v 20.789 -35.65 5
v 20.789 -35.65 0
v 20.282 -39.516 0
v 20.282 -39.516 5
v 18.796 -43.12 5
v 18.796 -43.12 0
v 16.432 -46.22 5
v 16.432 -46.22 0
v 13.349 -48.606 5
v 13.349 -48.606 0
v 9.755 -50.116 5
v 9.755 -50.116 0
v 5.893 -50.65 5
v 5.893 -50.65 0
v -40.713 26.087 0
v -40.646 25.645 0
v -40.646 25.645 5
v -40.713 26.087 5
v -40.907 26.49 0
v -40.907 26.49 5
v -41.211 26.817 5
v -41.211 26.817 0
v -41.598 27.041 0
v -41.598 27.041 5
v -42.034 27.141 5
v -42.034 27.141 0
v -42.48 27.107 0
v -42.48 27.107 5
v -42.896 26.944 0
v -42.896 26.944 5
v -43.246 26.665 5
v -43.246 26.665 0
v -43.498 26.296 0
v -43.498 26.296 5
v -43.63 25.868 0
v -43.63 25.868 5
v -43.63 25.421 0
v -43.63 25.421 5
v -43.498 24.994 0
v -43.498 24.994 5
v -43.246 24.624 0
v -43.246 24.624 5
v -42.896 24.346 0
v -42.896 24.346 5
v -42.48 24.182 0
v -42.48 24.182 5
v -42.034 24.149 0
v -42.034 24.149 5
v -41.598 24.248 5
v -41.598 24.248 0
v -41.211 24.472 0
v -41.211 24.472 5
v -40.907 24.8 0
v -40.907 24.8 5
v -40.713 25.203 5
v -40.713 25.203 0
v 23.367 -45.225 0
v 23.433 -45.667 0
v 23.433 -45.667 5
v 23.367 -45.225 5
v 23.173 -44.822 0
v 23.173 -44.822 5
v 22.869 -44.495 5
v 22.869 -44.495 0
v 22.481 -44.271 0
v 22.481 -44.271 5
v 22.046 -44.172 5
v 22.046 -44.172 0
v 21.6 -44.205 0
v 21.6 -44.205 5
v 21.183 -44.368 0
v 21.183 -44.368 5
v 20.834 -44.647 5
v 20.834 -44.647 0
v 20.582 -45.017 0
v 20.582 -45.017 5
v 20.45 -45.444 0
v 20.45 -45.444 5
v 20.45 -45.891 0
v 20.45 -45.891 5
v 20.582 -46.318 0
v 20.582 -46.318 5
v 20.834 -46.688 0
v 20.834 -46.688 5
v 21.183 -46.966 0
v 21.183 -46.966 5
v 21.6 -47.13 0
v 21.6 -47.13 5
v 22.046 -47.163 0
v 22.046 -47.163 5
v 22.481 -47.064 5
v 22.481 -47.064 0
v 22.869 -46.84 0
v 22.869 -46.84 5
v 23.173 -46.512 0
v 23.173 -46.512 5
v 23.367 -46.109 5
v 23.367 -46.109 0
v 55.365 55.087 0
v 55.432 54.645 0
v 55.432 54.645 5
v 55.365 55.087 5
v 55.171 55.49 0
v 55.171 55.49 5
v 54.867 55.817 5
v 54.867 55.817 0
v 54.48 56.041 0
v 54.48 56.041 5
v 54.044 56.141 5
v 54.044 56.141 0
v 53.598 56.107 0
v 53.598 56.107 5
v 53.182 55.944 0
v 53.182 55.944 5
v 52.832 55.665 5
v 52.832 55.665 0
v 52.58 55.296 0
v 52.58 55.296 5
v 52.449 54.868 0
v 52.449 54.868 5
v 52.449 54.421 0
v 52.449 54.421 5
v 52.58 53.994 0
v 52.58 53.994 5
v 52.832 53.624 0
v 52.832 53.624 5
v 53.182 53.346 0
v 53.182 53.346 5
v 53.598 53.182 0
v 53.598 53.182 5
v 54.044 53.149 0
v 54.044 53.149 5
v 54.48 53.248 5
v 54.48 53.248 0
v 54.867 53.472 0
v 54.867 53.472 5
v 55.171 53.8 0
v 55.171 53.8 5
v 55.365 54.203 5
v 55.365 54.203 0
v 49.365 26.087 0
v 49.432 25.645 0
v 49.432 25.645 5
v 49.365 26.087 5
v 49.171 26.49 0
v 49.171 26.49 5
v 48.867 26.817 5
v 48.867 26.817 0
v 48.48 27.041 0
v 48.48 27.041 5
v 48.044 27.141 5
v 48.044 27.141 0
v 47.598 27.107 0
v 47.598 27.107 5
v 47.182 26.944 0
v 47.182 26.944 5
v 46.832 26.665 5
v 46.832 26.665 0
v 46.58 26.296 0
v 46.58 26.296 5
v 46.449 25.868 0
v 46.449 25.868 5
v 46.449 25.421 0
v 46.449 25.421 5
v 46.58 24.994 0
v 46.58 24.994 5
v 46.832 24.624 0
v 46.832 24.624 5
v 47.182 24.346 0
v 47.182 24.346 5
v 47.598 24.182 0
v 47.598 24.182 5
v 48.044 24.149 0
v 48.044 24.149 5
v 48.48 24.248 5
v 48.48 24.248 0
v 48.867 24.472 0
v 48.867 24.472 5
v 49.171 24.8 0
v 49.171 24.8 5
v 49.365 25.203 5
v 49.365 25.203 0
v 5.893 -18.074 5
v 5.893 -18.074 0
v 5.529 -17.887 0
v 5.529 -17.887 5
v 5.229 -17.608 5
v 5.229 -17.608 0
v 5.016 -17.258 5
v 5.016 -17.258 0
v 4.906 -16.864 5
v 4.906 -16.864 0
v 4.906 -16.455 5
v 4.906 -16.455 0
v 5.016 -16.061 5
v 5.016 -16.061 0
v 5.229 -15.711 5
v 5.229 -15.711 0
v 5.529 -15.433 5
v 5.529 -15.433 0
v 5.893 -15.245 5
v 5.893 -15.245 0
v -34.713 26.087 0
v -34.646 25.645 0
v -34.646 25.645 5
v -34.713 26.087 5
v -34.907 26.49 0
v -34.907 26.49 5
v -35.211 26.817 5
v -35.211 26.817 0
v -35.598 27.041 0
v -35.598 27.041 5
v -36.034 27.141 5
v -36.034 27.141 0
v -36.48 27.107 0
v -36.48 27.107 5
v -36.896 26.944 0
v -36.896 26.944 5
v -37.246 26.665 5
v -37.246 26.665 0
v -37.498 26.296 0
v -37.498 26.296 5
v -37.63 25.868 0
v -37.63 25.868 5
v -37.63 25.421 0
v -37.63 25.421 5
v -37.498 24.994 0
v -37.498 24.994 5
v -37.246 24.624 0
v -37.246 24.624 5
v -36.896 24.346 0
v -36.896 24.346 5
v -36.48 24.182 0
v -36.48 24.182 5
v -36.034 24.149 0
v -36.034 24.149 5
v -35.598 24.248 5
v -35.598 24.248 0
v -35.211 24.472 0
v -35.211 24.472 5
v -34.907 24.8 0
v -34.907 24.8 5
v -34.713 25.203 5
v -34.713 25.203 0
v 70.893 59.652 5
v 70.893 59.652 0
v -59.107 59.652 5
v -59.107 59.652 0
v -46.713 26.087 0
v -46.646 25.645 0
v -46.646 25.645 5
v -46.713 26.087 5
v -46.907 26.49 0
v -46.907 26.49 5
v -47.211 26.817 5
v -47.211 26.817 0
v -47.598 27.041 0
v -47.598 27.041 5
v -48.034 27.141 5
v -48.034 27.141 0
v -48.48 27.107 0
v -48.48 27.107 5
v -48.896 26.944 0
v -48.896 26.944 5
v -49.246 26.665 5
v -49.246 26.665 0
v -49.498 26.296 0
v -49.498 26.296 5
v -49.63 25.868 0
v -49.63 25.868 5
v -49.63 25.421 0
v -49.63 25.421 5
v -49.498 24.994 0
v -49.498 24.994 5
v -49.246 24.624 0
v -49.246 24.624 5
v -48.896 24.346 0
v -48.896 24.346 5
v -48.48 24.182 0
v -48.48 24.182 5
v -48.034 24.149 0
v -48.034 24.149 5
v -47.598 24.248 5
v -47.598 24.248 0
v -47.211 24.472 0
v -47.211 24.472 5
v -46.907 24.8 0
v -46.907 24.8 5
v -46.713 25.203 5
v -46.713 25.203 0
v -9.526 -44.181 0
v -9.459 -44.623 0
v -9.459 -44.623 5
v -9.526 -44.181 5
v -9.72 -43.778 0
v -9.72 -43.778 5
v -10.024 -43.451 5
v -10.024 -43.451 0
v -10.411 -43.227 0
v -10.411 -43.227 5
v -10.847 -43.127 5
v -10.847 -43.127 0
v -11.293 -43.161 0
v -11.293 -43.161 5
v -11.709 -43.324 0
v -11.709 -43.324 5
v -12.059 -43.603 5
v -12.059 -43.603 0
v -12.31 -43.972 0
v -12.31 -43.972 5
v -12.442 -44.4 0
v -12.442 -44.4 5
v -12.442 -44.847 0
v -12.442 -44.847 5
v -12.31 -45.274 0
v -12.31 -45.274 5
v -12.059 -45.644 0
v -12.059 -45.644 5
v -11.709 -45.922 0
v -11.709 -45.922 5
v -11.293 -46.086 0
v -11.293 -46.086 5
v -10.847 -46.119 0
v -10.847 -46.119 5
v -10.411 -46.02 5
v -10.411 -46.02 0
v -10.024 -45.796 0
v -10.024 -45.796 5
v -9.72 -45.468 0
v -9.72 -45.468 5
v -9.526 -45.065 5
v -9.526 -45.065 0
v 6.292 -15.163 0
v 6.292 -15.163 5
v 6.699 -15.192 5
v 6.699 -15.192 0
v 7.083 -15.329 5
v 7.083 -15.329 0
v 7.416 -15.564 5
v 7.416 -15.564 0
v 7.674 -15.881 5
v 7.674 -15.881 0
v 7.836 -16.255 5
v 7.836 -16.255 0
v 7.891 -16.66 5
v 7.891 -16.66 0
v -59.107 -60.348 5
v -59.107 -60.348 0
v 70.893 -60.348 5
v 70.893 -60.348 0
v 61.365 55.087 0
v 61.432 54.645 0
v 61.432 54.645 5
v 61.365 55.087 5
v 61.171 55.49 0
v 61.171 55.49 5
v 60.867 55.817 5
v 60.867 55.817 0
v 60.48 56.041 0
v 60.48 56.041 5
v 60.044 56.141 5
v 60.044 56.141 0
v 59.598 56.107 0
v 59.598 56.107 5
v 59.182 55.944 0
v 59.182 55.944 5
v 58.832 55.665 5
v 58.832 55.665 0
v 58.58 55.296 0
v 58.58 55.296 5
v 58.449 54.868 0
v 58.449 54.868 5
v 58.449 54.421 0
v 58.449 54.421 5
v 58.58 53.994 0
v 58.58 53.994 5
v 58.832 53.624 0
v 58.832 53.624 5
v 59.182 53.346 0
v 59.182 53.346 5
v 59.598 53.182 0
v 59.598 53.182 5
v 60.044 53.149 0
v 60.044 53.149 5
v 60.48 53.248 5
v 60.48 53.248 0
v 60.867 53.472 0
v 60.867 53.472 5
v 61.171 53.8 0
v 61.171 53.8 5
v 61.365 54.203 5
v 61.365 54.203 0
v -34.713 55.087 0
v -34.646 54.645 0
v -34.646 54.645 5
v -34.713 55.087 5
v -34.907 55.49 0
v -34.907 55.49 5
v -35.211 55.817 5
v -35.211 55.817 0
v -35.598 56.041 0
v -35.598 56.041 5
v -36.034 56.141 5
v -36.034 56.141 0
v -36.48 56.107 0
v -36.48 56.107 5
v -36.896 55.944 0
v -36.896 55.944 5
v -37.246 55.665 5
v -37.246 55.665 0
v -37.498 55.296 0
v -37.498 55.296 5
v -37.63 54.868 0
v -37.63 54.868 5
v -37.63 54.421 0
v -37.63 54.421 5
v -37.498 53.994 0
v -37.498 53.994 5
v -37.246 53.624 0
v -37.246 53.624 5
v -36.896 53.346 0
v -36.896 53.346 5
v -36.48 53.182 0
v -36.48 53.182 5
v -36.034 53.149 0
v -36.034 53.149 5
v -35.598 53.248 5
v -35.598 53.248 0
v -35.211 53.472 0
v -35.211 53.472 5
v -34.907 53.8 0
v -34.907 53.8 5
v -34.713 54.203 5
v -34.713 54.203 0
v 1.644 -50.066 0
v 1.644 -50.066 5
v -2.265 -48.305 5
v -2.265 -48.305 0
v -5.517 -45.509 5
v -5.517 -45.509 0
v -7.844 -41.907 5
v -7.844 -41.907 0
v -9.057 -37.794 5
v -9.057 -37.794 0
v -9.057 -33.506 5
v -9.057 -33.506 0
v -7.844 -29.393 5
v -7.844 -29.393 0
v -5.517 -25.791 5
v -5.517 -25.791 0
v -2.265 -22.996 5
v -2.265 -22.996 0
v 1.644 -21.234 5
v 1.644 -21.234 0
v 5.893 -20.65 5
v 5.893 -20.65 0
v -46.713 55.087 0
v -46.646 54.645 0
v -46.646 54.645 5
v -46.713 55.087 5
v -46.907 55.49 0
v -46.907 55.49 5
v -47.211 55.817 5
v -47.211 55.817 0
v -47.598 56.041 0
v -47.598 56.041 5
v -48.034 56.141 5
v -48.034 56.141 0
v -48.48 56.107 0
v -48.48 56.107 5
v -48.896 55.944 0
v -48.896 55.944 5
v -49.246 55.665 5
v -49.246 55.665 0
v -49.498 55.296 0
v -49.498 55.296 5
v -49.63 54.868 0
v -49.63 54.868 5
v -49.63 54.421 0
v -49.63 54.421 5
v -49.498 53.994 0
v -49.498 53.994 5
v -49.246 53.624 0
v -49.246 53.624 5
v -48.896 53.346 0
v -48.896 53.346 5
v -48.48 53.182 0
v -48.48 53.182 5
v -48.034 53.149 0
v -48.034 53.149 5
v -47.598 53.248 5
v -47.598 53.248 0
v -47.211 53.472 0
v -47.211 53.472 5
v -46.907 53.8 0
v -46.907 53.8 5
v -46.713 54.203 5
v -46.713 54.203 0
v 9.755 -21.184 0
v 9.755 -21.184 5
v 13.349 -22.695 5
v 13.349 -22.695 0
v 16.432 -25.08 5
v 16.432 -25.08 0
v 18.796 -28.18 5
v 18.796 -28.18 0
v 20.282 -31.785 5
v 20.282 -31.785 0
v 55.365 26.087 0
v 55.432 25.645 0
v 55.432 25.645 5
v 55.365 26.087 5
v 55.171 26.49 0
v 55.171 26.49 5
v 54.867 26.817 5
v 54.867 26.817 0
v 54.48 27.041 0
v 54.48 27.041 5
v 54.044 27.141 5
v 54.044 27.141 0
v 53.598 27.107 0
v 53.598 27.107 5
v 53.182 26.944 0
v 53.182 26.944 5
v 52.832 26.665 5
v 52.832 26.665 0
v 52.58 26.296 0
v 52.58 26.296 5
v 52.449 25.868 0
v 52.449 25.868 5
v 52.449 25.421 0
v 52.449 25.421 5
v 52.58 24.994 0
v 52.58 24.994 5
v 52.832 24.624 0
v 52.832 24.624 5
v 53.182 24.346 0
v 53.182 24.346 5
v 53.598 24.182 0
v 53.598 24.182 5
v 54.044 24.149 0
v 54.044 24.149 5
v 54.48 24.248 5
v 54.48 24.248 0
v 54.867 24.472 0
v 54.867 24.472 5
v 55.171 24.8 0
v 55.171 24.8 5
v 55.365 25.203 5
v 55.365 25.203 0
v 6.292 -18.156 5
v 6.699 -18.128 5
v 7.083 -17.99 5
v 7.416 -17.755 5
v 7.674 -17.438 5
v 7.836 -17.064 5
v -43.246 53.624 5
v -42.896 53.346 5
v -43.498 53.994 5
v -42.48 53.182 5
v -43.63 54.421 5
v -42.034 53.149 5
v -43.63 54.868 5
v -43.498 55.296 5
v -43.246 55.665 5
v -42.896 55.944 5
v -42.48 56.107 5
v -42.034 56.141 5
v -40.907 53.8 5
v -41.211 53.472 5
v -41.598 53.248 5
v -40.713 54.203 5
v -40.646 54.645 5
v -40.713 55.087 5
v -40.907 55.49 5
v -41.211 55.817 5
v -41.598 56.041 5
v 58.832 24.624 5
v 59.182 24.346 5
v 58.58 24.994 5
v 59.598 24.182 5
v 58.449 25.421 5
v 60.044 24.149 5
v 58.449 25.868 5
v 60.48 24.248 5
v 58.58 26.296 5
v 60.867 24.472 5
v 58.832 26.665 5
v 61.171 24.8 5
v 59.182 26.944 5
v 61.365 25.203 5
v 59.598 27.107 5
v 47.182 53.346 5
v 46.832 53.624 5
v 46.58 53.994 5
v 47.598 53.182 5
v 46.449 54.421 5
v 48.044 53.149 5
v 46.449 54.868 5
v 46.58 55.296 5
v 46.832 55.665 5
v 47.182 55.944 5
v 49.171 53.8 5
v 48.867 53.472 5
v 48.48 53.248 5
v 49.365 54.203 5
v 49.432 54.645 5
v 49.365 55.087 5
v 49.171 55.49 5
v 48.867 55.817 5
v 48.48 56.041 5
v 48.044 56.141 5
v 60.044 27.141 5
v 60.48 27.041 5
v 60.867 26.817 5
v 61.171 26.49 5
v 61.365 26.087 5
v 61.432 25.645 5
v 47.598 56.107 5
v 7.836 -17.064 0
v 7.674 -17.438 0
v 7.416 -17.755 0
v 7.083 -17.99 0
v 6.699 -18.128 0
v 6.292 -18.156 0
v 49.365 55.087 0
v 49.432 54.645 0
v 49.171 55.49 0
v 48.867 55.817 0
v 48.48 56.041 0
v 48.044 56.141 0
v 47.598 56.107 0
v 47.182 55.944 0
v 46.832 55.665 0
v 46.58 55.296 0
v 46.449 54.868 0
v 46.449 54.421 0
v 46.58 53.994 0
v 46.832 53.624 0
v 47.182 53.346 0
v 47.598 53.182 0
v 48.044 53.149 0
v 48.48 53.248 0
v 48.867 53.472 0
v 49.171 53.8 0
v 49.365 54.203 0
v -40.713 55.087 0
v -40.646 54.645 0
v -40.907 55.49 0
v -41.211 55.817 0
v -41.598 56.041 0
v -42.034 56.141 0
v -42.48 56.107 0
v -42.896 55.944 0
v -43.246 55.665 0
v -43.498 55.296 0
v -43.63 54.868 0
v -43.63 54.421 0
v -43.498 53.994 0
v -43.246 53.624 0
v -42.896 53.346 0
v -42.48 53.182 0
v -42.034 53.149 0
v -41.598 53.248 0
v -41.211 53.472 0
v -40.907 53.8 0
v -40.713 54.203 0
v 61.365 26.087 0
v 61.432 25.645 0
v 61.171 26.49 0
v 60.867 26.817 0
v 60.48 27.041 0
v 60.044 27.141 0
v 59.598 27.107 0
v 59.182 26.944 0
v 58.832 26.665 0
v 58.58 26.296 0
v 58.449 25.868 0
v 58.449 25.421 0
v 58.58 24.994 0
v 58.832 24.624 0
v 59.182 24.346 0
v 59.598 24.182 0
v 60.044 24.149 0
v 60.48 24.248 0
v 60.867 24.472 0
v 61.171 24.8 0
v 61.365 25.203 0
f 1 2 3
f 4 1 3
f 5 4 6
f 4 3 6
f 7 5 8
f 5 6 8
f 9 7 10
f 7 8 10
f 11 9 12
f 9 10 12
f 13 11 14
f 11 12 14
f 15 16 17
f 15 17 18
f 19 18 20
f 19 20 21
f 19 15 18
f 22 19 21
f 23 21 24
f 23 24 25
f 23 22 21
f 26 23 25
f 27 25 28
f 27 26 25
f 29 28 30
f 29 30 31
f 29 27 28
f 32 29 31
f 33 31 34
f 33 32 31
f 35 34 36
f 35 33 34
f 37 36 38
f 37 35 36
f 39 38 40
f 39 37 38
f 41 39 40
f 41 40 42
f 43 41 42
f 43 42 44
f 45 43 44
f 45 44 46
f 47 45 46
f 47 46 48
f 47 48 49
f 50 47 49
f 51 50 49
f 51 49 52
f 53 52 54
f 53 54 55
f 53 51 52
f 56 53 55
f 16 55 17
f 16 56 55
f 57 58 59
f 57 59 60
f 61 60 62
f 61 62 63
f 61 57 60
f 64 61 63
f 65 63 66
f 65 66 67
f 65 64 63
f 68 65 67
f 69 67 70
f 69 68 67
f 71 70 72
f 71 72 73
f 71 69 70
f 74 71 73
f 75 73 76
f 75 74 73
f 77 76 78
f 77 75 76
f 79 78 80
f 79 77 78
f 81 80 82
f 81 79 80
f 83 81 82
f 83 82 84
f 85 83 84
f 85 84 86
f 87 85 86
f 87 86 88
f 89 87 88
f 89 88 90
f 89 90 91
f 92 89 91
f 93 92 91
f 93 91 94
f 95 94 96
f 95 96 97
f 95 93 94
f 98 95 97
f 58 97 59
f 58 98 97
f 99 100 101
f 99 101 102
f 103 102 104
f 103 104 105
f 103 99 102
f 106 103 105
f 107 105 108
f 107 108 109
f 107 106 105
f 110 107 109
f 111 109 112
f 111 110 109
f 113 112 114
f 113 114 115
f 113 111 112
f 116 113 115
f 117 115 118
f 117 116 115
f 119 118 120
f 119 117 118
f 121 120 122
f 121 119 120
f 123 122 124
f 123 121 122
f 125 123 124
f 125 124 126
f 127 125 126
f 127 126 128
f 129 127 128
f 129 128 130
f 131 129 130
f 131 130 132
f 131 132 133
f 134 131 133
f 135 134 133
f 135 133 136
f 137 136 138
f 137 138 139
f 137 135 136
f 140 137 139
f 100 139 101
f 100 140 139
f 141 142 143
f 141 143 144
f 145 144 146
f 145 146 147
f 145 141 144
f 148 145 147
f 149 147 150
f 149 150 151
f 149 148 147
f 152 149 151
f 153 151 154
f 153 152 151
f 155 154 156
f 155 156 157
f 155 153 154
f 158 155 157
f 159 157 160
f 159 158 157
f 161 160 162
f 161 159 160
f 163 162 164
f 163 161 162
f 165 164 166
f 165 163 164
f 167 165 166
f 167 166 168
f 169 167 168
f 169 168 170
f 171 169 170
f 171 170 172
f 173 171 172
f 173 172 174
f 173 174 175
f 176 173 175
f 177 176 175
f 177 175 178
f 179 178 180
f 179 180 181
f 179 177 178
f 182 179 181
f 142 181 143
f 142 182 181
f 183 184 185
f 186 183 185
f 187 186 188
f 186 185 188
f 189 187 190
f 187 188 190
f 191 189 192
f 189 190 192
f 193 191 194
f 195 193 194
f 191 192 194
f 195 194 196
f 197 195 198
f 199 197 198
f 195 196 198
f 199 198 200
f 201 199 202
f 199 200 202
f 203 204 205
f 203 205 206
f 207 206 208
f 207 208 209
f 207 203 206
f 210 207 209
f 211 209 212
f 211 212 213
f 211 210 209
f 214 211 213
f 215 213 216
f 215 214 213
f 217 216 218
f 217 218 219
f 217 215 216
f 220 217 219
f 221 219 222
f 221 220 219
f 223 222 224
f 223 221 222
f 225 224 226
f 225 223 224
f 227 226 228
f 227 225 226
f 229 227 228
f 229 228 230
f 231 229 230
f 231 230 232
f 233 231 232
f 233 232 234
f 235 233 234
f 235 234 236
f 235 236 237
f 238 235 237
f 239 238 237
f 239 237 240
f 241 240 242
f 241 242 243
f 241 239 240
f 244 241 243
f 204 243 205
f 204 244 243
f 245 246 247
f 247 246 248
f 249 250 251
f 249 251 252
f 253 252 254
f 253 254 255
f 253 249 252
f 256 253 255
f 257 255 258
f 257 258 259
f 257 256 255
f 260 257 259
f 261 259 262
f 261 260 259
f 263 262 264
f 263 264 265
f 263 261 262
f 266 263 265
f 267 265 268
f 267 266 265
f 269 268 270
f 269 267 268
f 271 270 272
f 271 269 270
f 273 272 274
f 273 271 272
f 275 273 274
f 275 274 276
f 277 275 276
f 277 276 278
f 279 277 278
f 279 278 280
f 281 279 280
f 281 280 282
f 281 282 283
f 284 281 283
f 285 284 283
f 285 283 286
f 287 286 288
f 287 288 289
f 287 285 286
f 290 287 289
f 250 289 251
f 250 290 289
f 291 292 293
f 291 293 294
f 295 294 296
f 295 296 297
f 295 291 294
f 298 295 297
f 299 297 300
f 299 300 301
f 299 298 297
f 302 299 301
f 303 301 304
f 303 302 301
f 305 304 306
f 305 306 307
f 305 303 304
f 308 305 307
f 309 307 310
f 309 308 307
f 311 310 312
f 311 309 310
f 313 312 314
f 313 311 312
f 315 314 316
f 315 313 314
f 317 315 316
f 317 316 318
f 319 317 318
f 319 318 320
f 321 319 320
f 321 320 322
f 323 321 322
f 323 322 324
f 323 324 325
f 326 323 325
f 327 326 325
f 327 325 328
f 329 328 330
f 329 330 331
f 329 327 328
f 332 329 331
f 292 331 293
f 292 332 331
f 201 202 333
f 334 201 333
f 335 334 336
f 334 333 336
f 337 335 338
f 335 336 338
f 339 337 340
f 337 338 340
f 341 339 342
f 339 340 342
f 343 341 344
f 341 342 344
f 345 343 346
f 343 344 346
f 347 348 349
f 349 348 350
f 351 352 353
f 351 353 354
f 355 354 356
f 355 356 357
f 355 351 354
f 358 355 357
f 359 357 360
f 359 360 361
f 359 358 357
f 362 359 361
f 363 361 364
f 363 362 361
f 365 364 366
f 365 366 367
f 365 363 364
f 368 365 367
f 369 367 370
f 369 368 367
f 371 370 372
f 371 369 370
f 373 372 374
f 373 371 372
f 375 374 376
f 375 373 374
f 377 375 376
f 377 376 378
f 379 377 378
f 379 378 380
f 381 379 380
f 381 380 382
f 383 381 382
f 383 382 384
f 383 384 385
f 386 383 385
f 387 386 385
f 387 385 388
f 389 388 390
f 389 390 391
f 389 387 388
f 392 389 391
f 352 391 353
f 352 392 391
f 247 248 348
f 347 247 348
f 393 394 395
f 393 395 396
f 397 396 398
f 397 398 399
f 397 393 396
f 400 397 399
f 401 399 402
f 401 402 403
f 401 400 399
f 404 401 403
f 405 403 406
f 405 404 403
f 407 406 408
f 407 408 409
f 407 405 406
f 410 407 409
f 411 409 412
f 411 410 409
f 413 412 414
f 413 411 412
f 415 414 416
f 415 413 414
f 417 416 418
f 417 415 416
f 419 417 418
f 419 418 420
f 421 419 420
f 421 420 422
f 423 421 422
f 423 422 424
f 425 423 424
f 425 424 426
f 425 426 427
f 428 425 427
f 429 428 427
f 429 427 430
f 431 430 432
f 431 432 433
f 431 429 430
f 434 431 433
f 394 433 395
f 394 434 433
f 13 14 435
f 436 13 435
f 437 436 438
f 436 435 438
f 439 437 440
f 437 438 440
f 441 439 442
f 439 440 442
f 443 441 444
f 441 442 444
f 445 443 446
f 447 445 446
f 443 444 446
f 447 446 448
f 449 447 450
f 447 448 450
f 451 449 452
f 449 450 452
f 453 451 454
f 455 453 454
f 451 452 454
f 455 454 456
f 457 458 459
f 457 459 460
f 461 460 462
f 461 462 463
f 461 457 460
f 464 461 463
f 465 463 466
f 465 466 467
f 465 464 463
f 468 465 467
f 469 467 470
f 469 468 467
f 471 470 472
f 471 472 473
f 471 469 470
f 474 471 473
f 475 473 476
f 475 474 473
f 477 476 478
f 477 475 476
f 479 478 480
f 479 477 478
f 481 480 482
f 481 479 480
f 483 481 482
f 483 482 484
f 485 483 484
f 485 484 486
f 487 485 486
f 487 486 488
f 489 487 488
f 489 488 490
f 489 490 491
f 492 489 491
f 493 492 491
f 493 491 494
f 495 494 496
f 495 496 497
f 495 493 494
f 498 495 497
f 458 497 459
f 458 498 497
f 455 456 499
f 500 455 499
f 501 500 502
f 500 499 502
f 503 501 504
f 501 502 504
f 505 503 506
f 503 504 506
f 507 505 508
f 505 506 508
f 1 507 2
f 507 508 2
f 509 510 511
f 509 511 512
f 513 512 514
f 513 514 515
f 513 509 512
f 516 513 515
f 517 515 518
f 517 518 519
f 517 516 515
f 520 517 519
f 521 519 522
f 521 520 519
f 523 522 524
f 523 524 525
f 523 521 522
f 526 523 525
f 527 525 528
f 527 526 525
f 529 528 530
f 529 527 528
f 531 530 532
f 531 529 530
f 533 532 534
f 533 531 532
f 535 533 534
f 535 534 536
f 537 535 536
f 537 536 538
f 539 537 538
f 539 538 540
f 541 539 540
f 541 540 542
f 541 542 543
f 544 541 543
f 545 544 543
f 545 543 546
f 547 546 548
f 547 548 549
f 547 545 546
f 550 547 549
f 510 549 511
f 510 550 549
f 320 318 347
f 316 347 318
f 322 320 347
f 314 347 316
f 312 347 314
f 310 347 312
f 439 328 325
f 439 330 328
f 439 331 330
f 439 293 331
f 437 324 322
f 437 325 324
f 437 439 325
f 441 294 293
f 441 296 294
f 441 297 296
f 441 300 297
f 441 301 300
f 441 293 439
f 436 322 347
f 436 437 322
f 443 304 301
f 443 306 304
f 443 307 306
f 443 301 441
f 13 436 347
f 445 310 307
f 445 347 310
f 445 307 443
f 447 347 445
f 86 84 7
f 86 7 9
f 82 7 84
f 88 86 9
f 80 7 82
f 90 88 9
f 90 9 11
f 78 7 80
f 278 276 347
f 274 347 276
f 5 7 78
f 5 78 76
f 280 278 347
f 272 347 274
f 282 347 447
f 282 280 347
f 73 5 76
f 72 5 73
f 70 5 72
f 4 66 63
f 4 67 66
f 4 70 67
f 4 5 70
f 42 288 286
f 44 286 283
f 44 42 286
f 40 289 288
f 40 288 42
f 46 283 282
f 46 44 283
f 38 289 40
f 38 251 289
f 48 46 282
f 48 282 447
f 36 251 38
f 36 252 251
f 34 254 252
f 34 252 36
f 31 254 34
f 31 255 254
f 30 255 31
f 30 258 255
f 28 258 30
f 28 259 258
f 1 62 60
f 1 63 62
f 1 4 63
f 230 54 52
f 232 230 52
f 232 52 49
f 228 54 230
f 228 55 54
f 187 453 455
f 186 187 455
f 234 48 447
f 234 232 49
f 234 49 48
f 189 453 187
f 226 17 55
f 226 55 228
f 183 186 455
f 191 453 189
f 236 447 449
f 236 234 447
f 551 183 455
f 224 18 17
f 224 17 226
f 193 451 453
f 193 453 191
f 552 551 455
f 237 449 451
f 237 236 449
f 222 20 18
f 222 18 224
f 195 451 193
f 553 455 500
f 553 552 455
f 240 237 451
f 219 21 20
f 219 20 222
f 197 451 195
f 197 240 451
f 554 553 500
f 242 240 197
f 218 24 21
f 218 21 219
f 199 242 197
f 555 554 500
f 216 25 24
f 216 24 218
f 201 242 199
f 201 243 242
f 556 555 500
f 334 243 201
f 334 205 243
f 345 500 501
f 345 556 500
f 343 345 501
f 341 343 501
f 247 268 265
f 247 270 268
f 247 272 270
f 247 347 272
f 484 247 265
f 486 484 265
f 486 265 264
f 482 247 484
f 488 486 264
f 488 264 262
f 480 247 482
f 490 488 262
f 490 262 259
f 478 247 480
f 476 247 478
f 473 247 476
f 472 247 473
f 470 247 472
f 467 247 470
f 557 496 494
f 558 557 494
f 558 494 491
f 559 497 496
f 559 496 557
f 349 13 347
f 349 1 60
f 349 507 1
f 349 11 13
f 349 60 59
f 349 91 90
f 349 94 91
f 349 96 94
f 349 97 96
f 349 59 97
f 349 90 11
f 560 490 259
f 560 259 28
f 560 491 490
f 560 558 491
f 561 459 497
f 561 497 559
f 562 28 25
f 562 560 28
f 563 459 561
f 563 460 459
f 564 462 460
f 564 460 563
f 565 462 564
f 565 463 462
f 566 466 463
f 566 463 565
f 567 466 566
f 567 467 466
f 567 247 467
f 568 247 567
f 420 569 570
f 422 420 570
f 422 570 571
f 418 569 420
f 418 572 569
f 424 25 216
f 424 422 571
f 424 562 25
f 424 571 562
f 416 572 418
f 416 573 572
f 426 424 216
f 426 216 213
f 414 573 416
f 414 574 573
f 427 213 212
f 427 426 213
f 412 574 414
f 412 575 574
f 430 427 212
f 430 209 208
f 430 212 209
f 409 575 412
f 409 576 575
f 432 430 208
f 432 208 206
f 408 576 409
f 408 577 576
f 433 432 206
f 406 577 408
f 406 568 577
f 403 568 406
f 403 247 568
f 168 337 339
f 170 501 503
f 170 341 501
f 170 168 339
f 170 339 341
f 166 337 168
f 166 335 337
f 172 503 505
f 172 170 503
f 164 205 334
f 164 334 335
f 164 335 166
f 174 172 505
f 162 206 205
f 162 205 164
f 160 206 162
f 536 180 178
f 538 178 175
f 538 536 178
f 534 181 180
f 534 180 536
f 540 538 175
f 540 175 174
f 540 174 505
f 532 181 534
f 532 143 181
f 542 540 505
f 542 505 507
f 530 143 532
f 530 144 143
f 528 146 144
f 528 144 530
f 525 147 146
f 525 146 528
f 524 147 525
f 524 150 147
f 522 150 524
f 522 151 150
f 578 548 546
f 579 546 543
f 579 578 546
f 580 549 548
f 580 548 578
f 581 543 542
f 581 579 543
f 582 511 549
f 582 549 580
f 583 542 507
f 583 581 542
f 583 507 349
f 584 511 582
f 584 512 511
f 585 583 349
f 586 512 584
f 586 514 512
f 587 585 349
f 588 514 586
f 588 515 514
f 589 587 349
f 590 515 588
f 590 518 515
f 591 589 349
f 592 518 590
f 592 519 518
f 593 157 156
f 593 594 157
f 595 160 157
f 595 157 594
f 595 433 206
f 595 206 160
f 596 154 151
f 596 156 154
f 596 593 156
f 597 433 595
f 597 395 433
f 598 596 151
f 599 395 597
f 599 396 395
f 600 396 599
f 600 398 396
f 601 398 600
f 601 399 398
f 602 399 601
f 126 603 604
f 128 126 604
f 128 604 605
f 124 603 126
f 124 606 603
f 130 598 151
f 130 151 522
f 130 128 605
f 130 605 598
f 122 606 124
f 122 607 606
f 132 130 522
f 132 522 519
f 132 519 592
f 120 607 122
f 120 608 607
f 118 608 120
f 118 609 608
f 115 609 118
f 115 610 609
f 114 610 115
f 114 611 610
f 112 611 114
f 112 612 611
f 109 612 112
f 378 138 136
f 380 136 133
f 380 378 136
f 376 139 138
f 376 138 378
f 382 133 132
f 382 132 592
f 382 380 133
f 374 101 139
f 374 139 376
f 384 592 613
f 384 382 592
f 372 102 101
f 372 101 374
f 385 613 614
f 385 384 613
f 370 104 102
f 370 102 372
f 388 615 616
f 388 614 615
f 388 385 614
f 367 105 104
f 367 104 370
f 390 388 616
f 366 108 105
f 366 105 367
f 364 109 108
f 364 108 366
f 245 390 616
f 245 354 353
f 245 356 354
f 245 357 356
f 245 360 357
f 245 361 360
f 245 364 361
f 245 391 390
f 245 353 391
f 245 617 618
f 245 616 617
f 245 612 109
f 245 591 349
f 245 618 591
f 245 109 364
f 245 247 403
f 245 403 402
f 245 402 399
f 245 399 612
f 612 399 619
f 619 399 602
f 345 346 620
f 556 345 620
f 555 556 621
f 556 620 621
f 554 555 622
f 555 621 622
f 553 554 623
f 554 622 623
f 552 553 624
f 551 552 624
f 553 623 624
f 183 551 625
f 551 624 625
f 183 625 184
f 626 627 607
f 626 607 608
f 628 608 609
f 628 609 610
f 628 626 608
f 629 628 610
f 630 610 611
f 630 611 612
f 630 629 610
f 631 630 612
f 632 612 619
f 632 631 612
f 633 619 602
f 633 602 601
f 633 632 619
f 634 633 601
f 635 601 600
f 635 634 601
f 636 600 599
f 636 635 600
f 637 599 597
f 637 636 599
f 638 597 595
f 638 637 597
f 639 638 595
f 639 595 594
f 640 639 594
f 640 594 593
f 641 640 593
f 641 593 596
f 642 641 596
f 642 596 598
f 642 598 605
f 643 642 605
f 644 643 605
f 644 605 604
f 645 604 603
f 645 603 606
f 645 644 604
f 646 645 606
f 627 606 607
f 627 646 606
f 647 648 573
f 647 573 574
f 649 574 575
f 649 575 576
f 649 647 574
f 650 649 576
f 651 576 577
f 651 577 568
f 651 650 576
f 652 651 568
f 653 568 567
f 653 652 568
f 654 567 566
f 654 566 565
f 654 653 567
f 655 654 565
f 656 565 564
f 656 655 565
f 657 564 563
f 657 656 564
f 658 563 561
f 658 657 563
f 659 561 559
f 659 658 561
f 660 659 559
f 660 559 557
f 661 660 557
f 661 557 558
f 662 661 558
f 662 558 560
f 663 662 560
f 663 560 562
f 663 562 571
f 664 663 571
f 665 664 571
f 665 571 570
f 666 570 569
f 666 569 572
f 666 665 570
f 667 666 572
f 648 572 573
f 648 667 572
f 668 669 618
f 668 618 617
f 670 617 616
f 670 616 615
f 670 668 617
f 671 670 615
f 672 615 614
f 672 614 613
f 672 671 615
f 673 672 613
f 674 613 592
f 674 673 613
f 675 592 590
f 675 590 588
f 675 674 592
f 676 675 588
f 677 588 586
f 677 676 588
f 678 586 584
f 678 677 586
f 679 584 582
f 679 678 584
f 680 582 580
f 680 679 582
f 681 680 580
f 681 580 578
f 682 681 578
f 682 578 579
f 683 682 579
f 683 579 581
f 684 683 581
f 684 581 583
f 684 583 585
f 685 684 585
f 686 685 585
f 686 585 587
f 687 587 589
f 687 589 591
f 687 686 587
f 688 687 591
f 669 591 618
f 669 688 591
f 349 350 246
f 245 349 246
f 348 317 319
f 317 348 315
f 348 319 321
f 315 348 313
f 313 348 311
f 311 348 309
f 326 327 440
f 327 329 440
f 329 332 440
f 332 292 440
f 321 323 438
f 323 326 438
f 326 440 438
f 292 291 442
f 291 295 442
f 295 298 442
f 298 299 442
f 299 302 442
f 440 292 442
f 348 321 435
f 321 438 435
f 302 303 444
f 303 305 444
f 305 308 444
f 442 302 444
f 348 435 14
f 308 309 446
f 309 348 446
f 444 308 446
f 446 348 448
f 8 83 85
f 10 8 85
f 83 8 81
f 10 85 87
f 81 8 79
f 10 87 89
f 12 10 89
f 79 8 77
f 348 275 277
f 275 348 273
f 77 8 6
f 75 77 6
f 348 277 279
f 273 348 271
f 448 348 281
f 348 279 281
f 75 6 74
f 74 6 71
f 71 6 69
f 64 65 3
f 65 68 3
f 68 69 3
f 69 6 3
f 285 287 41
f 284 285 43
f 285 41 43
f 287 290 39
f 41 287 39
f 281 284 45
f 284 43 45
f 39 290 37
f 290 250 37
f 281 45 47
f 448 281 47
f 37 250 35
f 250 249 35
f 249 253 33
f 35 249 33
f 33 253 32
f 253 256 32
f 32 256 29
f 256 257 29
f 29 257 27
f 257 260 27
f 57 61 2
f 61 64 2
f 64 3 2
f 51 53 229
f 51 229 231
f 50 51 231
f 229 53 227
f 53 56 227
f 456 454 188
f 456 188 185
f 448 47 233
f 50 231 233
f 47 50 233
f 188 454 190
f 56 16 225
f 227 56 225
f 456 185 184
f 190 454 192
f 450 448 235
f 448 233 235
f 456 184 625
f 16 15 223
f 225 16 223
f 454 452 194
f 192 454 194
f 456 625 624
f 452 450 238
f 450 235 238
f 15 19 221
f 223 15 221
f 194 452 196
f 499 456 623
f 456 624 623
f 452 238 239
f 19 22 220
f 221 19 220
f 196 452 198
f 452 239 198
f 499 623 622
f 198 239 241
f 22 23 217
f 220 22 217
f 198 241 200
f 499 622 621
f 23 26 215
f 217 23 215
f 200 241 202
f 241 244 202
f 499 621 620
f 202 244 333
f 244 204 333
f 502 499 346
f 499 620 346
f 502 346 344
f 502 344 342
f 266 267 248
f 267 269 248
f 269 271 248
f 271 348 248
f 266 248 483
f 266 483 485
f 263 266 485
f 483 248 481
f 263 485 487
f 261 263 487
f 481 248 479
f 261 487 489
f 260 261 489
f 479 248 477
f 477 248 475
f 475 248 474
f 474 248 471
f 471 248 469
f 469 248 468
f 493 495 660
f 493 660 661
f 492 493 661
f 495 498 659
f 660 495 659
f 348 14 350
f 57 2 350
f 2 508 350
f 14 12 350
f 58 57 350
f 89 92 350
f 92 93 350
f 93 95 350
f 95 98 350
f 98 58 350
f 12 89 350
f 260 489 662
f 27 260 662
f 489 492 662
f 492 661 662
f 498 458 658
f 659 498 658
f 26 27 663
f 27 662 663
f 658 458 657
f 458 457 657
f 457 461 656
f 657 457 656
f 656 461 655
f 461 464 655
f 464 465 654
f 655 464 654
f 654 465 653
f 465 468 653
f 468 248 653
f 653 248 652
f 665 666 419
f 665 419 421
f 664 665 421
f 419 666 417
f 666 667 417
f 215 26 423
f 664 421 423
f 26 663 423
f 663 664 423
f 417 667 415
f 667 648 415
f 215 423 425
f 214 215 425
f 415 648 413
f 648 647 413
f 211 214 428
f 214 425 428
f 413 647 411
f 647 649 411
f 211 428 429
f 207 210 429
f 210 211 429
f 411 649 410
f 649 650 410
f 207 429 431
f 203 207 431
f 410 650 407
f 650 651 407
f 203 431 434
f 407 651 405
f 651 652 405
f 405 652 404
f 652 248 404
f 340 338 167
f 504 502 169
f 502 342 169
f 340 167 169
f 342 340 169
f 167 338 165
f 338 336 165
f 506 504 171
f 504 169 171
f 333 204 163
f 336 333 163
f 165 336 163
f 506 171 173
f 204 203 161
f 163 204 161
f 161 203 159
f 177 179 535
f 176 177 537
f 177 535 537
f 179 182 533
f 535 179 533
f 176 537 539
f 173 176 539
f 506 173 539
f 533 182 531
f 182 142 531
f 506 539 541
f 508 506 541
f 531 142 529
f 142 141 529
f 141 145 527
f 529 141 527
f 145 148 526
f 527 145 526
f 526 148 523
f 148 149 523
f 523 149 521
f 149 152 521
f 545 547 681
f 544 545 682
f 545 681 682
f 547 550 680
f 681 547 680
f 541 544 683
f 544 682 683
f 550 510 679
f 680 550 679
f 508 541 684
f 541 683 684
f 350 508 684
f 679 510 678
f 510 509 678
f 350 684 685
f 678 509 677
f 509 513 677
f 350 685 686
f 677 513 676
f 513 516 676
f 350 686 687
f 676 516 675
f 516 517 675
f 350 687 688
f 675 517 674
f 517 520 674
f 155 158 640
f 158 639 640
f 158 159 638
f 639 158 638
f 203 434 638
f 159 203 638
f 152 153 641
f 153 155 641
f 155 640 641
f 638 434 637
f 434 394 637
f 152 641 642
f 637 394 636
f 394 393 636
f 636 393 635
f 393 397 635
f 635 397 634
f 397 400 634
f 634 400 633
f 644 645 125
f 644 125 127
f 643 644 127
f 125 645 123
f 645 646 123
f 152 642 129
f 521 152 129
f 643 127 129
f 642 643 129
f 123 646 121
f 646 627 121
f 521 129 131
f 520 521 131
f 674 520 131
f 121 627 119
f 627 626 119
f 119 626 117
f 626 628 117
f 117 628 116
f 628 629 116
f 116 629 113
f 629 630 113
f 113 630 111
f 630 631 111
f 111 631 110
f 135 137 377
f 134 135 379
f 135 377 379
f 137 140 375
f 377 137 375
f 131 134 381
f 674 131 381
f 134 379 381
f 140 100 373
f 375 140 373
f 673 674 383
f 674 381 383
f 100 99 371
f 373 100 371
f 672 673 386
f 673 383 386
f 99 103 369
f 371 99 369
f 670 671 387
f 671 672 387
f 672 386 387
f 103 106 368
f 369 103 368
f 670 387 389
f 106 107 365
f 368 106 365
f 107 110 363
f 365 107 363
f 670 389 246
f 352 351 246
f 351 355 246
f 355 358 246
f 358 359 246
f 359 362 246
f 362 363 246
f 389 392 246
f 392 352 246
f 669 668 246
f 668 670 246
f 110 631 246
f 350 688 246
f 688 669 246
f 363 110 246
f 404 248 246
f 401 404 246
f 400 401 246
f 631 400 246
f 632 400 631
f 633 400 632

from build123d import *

# Parameters (mm, degrees)
F0_R     = 1.5
F0_W     = 65
F0_H     = 59.651572
F1_DEPTH = 5


with BuildPart() as f1:
    # F0 (on Top) → F1 (new body)
    with BuildSketch(Plane.XY):
        with BuildLine():
            Line((5.892689, 0), (-59.107311, 0))
            Line((-59.107311, 0), (-59.107311, -60.348428))
            Line((-59.107311, -60.348428), (5.892689, -60.348428))
            Line((5.892689, -60.348428), (5.892689, -50.649721))
            ThreePointArc((5.892689, -50.649721), (-9.211324, -35.650082), (5.892689, -20.650443))
            Line((5.892689, -20.650443), (5.892689, -18.074285))
            ThreePointArc((5.892689, -18.074285), (4.891486, -16.659647), (5.892689, -15.245008))
            Line((5.892689, -15.245008), (5.892689, 0))
        make_face()
        with Locations((-10.958927, -44.623251)):
            Circle(F0_R, mode=Mode.SUBTRACT)
        with Locations((-26.607311, 29.825786)):
            Rectangle(F0_W, F0_H)
        with Locations((-48.146435, 25.644738)):
            Circle(F0_R, mode=Mode.SUBTRACT)
        with Locations((-42.146435, 25.644738)):
            Circle(F0_R, mode=Mode.SUBTRACT)
        with Locations((-36.146435, 25.644738)):
            Circle(F0_R, mode=Mode.SUBTRACT)
        with Locations((-48.146435, 54.644738)):
            Circle(F0_R, mode=Mode.SUBTRACT)
        with Locations((-42.146435, 54.644738)):
            Circle(F0_R, mode=Mode.SUBTRACT)
        with Locations((-36.146435, 54.644738)):
            Circle(F0_R, mode=Mode.SUBTRACT)
        with Locations((38.392689, 29.825786)):
            Rectangle(F0_W, F0_H)
        with Locations((47.931814, 25.644738)):
            Circle(F0_R, mode=Mode.SUBTRACT)
        with Locations((53.931814, 25.644738)):
            Circle(F0_R, mode=Mode.SUBTRACT)
        with Locations((59.931814, 25.644738)):
            Circle(F0_R, mode=Mode.SUBTRACT)
        with Locations((47.931814, 54.644738)):
            Circle(F0_R, mode=Mode.SUBTRACT)
        with Locations((53.931814, 54.644738)):
            Circle(F0_R, mode=Mode.SUBTRACT)
        with Locations((59.931814, 54.644738)):
            Circle(F0_R, mode=Mode.SUBTRACT)
        with BuildLine():
            Line((70.892689, 0), (5.892689, 0))
            Line((5.892689, 0), (5.892689, -15.245008))
            ThreePointArc((5.892689, -15.245008), (7.258032, -15.435271), (7.891486, -16.659647))
            ThreePointArc((7.891486, -16.659647), (7.258032, -17.884023), (5.892689, -18.074285))
            Line((5.892689, -18.074285), (5.892689, -20.650443))
            ThreePointArc((5.892689, -20.650443), (16.431989, -25.080318), (20.788676, -35.650082))
            ThreePointArc((20.788676, -35.650082), (16.431989, -46.219846), (5.892689, -50.649721))
            Line((5.892689, -50.649721), (5.892689, -60.348428))
            Line((5.892689, -60.348428), (70.892689, -60.348428))
            Line((70.892689, -60.348428), (70.892689, 0))
        make_face()
        with Locations((21.933471, -45.667347)):
            Circle(F0_R, mode=Mode.SUBTRACT)
    extrude(amount=F1_DEPTH)


solid = f1.part
